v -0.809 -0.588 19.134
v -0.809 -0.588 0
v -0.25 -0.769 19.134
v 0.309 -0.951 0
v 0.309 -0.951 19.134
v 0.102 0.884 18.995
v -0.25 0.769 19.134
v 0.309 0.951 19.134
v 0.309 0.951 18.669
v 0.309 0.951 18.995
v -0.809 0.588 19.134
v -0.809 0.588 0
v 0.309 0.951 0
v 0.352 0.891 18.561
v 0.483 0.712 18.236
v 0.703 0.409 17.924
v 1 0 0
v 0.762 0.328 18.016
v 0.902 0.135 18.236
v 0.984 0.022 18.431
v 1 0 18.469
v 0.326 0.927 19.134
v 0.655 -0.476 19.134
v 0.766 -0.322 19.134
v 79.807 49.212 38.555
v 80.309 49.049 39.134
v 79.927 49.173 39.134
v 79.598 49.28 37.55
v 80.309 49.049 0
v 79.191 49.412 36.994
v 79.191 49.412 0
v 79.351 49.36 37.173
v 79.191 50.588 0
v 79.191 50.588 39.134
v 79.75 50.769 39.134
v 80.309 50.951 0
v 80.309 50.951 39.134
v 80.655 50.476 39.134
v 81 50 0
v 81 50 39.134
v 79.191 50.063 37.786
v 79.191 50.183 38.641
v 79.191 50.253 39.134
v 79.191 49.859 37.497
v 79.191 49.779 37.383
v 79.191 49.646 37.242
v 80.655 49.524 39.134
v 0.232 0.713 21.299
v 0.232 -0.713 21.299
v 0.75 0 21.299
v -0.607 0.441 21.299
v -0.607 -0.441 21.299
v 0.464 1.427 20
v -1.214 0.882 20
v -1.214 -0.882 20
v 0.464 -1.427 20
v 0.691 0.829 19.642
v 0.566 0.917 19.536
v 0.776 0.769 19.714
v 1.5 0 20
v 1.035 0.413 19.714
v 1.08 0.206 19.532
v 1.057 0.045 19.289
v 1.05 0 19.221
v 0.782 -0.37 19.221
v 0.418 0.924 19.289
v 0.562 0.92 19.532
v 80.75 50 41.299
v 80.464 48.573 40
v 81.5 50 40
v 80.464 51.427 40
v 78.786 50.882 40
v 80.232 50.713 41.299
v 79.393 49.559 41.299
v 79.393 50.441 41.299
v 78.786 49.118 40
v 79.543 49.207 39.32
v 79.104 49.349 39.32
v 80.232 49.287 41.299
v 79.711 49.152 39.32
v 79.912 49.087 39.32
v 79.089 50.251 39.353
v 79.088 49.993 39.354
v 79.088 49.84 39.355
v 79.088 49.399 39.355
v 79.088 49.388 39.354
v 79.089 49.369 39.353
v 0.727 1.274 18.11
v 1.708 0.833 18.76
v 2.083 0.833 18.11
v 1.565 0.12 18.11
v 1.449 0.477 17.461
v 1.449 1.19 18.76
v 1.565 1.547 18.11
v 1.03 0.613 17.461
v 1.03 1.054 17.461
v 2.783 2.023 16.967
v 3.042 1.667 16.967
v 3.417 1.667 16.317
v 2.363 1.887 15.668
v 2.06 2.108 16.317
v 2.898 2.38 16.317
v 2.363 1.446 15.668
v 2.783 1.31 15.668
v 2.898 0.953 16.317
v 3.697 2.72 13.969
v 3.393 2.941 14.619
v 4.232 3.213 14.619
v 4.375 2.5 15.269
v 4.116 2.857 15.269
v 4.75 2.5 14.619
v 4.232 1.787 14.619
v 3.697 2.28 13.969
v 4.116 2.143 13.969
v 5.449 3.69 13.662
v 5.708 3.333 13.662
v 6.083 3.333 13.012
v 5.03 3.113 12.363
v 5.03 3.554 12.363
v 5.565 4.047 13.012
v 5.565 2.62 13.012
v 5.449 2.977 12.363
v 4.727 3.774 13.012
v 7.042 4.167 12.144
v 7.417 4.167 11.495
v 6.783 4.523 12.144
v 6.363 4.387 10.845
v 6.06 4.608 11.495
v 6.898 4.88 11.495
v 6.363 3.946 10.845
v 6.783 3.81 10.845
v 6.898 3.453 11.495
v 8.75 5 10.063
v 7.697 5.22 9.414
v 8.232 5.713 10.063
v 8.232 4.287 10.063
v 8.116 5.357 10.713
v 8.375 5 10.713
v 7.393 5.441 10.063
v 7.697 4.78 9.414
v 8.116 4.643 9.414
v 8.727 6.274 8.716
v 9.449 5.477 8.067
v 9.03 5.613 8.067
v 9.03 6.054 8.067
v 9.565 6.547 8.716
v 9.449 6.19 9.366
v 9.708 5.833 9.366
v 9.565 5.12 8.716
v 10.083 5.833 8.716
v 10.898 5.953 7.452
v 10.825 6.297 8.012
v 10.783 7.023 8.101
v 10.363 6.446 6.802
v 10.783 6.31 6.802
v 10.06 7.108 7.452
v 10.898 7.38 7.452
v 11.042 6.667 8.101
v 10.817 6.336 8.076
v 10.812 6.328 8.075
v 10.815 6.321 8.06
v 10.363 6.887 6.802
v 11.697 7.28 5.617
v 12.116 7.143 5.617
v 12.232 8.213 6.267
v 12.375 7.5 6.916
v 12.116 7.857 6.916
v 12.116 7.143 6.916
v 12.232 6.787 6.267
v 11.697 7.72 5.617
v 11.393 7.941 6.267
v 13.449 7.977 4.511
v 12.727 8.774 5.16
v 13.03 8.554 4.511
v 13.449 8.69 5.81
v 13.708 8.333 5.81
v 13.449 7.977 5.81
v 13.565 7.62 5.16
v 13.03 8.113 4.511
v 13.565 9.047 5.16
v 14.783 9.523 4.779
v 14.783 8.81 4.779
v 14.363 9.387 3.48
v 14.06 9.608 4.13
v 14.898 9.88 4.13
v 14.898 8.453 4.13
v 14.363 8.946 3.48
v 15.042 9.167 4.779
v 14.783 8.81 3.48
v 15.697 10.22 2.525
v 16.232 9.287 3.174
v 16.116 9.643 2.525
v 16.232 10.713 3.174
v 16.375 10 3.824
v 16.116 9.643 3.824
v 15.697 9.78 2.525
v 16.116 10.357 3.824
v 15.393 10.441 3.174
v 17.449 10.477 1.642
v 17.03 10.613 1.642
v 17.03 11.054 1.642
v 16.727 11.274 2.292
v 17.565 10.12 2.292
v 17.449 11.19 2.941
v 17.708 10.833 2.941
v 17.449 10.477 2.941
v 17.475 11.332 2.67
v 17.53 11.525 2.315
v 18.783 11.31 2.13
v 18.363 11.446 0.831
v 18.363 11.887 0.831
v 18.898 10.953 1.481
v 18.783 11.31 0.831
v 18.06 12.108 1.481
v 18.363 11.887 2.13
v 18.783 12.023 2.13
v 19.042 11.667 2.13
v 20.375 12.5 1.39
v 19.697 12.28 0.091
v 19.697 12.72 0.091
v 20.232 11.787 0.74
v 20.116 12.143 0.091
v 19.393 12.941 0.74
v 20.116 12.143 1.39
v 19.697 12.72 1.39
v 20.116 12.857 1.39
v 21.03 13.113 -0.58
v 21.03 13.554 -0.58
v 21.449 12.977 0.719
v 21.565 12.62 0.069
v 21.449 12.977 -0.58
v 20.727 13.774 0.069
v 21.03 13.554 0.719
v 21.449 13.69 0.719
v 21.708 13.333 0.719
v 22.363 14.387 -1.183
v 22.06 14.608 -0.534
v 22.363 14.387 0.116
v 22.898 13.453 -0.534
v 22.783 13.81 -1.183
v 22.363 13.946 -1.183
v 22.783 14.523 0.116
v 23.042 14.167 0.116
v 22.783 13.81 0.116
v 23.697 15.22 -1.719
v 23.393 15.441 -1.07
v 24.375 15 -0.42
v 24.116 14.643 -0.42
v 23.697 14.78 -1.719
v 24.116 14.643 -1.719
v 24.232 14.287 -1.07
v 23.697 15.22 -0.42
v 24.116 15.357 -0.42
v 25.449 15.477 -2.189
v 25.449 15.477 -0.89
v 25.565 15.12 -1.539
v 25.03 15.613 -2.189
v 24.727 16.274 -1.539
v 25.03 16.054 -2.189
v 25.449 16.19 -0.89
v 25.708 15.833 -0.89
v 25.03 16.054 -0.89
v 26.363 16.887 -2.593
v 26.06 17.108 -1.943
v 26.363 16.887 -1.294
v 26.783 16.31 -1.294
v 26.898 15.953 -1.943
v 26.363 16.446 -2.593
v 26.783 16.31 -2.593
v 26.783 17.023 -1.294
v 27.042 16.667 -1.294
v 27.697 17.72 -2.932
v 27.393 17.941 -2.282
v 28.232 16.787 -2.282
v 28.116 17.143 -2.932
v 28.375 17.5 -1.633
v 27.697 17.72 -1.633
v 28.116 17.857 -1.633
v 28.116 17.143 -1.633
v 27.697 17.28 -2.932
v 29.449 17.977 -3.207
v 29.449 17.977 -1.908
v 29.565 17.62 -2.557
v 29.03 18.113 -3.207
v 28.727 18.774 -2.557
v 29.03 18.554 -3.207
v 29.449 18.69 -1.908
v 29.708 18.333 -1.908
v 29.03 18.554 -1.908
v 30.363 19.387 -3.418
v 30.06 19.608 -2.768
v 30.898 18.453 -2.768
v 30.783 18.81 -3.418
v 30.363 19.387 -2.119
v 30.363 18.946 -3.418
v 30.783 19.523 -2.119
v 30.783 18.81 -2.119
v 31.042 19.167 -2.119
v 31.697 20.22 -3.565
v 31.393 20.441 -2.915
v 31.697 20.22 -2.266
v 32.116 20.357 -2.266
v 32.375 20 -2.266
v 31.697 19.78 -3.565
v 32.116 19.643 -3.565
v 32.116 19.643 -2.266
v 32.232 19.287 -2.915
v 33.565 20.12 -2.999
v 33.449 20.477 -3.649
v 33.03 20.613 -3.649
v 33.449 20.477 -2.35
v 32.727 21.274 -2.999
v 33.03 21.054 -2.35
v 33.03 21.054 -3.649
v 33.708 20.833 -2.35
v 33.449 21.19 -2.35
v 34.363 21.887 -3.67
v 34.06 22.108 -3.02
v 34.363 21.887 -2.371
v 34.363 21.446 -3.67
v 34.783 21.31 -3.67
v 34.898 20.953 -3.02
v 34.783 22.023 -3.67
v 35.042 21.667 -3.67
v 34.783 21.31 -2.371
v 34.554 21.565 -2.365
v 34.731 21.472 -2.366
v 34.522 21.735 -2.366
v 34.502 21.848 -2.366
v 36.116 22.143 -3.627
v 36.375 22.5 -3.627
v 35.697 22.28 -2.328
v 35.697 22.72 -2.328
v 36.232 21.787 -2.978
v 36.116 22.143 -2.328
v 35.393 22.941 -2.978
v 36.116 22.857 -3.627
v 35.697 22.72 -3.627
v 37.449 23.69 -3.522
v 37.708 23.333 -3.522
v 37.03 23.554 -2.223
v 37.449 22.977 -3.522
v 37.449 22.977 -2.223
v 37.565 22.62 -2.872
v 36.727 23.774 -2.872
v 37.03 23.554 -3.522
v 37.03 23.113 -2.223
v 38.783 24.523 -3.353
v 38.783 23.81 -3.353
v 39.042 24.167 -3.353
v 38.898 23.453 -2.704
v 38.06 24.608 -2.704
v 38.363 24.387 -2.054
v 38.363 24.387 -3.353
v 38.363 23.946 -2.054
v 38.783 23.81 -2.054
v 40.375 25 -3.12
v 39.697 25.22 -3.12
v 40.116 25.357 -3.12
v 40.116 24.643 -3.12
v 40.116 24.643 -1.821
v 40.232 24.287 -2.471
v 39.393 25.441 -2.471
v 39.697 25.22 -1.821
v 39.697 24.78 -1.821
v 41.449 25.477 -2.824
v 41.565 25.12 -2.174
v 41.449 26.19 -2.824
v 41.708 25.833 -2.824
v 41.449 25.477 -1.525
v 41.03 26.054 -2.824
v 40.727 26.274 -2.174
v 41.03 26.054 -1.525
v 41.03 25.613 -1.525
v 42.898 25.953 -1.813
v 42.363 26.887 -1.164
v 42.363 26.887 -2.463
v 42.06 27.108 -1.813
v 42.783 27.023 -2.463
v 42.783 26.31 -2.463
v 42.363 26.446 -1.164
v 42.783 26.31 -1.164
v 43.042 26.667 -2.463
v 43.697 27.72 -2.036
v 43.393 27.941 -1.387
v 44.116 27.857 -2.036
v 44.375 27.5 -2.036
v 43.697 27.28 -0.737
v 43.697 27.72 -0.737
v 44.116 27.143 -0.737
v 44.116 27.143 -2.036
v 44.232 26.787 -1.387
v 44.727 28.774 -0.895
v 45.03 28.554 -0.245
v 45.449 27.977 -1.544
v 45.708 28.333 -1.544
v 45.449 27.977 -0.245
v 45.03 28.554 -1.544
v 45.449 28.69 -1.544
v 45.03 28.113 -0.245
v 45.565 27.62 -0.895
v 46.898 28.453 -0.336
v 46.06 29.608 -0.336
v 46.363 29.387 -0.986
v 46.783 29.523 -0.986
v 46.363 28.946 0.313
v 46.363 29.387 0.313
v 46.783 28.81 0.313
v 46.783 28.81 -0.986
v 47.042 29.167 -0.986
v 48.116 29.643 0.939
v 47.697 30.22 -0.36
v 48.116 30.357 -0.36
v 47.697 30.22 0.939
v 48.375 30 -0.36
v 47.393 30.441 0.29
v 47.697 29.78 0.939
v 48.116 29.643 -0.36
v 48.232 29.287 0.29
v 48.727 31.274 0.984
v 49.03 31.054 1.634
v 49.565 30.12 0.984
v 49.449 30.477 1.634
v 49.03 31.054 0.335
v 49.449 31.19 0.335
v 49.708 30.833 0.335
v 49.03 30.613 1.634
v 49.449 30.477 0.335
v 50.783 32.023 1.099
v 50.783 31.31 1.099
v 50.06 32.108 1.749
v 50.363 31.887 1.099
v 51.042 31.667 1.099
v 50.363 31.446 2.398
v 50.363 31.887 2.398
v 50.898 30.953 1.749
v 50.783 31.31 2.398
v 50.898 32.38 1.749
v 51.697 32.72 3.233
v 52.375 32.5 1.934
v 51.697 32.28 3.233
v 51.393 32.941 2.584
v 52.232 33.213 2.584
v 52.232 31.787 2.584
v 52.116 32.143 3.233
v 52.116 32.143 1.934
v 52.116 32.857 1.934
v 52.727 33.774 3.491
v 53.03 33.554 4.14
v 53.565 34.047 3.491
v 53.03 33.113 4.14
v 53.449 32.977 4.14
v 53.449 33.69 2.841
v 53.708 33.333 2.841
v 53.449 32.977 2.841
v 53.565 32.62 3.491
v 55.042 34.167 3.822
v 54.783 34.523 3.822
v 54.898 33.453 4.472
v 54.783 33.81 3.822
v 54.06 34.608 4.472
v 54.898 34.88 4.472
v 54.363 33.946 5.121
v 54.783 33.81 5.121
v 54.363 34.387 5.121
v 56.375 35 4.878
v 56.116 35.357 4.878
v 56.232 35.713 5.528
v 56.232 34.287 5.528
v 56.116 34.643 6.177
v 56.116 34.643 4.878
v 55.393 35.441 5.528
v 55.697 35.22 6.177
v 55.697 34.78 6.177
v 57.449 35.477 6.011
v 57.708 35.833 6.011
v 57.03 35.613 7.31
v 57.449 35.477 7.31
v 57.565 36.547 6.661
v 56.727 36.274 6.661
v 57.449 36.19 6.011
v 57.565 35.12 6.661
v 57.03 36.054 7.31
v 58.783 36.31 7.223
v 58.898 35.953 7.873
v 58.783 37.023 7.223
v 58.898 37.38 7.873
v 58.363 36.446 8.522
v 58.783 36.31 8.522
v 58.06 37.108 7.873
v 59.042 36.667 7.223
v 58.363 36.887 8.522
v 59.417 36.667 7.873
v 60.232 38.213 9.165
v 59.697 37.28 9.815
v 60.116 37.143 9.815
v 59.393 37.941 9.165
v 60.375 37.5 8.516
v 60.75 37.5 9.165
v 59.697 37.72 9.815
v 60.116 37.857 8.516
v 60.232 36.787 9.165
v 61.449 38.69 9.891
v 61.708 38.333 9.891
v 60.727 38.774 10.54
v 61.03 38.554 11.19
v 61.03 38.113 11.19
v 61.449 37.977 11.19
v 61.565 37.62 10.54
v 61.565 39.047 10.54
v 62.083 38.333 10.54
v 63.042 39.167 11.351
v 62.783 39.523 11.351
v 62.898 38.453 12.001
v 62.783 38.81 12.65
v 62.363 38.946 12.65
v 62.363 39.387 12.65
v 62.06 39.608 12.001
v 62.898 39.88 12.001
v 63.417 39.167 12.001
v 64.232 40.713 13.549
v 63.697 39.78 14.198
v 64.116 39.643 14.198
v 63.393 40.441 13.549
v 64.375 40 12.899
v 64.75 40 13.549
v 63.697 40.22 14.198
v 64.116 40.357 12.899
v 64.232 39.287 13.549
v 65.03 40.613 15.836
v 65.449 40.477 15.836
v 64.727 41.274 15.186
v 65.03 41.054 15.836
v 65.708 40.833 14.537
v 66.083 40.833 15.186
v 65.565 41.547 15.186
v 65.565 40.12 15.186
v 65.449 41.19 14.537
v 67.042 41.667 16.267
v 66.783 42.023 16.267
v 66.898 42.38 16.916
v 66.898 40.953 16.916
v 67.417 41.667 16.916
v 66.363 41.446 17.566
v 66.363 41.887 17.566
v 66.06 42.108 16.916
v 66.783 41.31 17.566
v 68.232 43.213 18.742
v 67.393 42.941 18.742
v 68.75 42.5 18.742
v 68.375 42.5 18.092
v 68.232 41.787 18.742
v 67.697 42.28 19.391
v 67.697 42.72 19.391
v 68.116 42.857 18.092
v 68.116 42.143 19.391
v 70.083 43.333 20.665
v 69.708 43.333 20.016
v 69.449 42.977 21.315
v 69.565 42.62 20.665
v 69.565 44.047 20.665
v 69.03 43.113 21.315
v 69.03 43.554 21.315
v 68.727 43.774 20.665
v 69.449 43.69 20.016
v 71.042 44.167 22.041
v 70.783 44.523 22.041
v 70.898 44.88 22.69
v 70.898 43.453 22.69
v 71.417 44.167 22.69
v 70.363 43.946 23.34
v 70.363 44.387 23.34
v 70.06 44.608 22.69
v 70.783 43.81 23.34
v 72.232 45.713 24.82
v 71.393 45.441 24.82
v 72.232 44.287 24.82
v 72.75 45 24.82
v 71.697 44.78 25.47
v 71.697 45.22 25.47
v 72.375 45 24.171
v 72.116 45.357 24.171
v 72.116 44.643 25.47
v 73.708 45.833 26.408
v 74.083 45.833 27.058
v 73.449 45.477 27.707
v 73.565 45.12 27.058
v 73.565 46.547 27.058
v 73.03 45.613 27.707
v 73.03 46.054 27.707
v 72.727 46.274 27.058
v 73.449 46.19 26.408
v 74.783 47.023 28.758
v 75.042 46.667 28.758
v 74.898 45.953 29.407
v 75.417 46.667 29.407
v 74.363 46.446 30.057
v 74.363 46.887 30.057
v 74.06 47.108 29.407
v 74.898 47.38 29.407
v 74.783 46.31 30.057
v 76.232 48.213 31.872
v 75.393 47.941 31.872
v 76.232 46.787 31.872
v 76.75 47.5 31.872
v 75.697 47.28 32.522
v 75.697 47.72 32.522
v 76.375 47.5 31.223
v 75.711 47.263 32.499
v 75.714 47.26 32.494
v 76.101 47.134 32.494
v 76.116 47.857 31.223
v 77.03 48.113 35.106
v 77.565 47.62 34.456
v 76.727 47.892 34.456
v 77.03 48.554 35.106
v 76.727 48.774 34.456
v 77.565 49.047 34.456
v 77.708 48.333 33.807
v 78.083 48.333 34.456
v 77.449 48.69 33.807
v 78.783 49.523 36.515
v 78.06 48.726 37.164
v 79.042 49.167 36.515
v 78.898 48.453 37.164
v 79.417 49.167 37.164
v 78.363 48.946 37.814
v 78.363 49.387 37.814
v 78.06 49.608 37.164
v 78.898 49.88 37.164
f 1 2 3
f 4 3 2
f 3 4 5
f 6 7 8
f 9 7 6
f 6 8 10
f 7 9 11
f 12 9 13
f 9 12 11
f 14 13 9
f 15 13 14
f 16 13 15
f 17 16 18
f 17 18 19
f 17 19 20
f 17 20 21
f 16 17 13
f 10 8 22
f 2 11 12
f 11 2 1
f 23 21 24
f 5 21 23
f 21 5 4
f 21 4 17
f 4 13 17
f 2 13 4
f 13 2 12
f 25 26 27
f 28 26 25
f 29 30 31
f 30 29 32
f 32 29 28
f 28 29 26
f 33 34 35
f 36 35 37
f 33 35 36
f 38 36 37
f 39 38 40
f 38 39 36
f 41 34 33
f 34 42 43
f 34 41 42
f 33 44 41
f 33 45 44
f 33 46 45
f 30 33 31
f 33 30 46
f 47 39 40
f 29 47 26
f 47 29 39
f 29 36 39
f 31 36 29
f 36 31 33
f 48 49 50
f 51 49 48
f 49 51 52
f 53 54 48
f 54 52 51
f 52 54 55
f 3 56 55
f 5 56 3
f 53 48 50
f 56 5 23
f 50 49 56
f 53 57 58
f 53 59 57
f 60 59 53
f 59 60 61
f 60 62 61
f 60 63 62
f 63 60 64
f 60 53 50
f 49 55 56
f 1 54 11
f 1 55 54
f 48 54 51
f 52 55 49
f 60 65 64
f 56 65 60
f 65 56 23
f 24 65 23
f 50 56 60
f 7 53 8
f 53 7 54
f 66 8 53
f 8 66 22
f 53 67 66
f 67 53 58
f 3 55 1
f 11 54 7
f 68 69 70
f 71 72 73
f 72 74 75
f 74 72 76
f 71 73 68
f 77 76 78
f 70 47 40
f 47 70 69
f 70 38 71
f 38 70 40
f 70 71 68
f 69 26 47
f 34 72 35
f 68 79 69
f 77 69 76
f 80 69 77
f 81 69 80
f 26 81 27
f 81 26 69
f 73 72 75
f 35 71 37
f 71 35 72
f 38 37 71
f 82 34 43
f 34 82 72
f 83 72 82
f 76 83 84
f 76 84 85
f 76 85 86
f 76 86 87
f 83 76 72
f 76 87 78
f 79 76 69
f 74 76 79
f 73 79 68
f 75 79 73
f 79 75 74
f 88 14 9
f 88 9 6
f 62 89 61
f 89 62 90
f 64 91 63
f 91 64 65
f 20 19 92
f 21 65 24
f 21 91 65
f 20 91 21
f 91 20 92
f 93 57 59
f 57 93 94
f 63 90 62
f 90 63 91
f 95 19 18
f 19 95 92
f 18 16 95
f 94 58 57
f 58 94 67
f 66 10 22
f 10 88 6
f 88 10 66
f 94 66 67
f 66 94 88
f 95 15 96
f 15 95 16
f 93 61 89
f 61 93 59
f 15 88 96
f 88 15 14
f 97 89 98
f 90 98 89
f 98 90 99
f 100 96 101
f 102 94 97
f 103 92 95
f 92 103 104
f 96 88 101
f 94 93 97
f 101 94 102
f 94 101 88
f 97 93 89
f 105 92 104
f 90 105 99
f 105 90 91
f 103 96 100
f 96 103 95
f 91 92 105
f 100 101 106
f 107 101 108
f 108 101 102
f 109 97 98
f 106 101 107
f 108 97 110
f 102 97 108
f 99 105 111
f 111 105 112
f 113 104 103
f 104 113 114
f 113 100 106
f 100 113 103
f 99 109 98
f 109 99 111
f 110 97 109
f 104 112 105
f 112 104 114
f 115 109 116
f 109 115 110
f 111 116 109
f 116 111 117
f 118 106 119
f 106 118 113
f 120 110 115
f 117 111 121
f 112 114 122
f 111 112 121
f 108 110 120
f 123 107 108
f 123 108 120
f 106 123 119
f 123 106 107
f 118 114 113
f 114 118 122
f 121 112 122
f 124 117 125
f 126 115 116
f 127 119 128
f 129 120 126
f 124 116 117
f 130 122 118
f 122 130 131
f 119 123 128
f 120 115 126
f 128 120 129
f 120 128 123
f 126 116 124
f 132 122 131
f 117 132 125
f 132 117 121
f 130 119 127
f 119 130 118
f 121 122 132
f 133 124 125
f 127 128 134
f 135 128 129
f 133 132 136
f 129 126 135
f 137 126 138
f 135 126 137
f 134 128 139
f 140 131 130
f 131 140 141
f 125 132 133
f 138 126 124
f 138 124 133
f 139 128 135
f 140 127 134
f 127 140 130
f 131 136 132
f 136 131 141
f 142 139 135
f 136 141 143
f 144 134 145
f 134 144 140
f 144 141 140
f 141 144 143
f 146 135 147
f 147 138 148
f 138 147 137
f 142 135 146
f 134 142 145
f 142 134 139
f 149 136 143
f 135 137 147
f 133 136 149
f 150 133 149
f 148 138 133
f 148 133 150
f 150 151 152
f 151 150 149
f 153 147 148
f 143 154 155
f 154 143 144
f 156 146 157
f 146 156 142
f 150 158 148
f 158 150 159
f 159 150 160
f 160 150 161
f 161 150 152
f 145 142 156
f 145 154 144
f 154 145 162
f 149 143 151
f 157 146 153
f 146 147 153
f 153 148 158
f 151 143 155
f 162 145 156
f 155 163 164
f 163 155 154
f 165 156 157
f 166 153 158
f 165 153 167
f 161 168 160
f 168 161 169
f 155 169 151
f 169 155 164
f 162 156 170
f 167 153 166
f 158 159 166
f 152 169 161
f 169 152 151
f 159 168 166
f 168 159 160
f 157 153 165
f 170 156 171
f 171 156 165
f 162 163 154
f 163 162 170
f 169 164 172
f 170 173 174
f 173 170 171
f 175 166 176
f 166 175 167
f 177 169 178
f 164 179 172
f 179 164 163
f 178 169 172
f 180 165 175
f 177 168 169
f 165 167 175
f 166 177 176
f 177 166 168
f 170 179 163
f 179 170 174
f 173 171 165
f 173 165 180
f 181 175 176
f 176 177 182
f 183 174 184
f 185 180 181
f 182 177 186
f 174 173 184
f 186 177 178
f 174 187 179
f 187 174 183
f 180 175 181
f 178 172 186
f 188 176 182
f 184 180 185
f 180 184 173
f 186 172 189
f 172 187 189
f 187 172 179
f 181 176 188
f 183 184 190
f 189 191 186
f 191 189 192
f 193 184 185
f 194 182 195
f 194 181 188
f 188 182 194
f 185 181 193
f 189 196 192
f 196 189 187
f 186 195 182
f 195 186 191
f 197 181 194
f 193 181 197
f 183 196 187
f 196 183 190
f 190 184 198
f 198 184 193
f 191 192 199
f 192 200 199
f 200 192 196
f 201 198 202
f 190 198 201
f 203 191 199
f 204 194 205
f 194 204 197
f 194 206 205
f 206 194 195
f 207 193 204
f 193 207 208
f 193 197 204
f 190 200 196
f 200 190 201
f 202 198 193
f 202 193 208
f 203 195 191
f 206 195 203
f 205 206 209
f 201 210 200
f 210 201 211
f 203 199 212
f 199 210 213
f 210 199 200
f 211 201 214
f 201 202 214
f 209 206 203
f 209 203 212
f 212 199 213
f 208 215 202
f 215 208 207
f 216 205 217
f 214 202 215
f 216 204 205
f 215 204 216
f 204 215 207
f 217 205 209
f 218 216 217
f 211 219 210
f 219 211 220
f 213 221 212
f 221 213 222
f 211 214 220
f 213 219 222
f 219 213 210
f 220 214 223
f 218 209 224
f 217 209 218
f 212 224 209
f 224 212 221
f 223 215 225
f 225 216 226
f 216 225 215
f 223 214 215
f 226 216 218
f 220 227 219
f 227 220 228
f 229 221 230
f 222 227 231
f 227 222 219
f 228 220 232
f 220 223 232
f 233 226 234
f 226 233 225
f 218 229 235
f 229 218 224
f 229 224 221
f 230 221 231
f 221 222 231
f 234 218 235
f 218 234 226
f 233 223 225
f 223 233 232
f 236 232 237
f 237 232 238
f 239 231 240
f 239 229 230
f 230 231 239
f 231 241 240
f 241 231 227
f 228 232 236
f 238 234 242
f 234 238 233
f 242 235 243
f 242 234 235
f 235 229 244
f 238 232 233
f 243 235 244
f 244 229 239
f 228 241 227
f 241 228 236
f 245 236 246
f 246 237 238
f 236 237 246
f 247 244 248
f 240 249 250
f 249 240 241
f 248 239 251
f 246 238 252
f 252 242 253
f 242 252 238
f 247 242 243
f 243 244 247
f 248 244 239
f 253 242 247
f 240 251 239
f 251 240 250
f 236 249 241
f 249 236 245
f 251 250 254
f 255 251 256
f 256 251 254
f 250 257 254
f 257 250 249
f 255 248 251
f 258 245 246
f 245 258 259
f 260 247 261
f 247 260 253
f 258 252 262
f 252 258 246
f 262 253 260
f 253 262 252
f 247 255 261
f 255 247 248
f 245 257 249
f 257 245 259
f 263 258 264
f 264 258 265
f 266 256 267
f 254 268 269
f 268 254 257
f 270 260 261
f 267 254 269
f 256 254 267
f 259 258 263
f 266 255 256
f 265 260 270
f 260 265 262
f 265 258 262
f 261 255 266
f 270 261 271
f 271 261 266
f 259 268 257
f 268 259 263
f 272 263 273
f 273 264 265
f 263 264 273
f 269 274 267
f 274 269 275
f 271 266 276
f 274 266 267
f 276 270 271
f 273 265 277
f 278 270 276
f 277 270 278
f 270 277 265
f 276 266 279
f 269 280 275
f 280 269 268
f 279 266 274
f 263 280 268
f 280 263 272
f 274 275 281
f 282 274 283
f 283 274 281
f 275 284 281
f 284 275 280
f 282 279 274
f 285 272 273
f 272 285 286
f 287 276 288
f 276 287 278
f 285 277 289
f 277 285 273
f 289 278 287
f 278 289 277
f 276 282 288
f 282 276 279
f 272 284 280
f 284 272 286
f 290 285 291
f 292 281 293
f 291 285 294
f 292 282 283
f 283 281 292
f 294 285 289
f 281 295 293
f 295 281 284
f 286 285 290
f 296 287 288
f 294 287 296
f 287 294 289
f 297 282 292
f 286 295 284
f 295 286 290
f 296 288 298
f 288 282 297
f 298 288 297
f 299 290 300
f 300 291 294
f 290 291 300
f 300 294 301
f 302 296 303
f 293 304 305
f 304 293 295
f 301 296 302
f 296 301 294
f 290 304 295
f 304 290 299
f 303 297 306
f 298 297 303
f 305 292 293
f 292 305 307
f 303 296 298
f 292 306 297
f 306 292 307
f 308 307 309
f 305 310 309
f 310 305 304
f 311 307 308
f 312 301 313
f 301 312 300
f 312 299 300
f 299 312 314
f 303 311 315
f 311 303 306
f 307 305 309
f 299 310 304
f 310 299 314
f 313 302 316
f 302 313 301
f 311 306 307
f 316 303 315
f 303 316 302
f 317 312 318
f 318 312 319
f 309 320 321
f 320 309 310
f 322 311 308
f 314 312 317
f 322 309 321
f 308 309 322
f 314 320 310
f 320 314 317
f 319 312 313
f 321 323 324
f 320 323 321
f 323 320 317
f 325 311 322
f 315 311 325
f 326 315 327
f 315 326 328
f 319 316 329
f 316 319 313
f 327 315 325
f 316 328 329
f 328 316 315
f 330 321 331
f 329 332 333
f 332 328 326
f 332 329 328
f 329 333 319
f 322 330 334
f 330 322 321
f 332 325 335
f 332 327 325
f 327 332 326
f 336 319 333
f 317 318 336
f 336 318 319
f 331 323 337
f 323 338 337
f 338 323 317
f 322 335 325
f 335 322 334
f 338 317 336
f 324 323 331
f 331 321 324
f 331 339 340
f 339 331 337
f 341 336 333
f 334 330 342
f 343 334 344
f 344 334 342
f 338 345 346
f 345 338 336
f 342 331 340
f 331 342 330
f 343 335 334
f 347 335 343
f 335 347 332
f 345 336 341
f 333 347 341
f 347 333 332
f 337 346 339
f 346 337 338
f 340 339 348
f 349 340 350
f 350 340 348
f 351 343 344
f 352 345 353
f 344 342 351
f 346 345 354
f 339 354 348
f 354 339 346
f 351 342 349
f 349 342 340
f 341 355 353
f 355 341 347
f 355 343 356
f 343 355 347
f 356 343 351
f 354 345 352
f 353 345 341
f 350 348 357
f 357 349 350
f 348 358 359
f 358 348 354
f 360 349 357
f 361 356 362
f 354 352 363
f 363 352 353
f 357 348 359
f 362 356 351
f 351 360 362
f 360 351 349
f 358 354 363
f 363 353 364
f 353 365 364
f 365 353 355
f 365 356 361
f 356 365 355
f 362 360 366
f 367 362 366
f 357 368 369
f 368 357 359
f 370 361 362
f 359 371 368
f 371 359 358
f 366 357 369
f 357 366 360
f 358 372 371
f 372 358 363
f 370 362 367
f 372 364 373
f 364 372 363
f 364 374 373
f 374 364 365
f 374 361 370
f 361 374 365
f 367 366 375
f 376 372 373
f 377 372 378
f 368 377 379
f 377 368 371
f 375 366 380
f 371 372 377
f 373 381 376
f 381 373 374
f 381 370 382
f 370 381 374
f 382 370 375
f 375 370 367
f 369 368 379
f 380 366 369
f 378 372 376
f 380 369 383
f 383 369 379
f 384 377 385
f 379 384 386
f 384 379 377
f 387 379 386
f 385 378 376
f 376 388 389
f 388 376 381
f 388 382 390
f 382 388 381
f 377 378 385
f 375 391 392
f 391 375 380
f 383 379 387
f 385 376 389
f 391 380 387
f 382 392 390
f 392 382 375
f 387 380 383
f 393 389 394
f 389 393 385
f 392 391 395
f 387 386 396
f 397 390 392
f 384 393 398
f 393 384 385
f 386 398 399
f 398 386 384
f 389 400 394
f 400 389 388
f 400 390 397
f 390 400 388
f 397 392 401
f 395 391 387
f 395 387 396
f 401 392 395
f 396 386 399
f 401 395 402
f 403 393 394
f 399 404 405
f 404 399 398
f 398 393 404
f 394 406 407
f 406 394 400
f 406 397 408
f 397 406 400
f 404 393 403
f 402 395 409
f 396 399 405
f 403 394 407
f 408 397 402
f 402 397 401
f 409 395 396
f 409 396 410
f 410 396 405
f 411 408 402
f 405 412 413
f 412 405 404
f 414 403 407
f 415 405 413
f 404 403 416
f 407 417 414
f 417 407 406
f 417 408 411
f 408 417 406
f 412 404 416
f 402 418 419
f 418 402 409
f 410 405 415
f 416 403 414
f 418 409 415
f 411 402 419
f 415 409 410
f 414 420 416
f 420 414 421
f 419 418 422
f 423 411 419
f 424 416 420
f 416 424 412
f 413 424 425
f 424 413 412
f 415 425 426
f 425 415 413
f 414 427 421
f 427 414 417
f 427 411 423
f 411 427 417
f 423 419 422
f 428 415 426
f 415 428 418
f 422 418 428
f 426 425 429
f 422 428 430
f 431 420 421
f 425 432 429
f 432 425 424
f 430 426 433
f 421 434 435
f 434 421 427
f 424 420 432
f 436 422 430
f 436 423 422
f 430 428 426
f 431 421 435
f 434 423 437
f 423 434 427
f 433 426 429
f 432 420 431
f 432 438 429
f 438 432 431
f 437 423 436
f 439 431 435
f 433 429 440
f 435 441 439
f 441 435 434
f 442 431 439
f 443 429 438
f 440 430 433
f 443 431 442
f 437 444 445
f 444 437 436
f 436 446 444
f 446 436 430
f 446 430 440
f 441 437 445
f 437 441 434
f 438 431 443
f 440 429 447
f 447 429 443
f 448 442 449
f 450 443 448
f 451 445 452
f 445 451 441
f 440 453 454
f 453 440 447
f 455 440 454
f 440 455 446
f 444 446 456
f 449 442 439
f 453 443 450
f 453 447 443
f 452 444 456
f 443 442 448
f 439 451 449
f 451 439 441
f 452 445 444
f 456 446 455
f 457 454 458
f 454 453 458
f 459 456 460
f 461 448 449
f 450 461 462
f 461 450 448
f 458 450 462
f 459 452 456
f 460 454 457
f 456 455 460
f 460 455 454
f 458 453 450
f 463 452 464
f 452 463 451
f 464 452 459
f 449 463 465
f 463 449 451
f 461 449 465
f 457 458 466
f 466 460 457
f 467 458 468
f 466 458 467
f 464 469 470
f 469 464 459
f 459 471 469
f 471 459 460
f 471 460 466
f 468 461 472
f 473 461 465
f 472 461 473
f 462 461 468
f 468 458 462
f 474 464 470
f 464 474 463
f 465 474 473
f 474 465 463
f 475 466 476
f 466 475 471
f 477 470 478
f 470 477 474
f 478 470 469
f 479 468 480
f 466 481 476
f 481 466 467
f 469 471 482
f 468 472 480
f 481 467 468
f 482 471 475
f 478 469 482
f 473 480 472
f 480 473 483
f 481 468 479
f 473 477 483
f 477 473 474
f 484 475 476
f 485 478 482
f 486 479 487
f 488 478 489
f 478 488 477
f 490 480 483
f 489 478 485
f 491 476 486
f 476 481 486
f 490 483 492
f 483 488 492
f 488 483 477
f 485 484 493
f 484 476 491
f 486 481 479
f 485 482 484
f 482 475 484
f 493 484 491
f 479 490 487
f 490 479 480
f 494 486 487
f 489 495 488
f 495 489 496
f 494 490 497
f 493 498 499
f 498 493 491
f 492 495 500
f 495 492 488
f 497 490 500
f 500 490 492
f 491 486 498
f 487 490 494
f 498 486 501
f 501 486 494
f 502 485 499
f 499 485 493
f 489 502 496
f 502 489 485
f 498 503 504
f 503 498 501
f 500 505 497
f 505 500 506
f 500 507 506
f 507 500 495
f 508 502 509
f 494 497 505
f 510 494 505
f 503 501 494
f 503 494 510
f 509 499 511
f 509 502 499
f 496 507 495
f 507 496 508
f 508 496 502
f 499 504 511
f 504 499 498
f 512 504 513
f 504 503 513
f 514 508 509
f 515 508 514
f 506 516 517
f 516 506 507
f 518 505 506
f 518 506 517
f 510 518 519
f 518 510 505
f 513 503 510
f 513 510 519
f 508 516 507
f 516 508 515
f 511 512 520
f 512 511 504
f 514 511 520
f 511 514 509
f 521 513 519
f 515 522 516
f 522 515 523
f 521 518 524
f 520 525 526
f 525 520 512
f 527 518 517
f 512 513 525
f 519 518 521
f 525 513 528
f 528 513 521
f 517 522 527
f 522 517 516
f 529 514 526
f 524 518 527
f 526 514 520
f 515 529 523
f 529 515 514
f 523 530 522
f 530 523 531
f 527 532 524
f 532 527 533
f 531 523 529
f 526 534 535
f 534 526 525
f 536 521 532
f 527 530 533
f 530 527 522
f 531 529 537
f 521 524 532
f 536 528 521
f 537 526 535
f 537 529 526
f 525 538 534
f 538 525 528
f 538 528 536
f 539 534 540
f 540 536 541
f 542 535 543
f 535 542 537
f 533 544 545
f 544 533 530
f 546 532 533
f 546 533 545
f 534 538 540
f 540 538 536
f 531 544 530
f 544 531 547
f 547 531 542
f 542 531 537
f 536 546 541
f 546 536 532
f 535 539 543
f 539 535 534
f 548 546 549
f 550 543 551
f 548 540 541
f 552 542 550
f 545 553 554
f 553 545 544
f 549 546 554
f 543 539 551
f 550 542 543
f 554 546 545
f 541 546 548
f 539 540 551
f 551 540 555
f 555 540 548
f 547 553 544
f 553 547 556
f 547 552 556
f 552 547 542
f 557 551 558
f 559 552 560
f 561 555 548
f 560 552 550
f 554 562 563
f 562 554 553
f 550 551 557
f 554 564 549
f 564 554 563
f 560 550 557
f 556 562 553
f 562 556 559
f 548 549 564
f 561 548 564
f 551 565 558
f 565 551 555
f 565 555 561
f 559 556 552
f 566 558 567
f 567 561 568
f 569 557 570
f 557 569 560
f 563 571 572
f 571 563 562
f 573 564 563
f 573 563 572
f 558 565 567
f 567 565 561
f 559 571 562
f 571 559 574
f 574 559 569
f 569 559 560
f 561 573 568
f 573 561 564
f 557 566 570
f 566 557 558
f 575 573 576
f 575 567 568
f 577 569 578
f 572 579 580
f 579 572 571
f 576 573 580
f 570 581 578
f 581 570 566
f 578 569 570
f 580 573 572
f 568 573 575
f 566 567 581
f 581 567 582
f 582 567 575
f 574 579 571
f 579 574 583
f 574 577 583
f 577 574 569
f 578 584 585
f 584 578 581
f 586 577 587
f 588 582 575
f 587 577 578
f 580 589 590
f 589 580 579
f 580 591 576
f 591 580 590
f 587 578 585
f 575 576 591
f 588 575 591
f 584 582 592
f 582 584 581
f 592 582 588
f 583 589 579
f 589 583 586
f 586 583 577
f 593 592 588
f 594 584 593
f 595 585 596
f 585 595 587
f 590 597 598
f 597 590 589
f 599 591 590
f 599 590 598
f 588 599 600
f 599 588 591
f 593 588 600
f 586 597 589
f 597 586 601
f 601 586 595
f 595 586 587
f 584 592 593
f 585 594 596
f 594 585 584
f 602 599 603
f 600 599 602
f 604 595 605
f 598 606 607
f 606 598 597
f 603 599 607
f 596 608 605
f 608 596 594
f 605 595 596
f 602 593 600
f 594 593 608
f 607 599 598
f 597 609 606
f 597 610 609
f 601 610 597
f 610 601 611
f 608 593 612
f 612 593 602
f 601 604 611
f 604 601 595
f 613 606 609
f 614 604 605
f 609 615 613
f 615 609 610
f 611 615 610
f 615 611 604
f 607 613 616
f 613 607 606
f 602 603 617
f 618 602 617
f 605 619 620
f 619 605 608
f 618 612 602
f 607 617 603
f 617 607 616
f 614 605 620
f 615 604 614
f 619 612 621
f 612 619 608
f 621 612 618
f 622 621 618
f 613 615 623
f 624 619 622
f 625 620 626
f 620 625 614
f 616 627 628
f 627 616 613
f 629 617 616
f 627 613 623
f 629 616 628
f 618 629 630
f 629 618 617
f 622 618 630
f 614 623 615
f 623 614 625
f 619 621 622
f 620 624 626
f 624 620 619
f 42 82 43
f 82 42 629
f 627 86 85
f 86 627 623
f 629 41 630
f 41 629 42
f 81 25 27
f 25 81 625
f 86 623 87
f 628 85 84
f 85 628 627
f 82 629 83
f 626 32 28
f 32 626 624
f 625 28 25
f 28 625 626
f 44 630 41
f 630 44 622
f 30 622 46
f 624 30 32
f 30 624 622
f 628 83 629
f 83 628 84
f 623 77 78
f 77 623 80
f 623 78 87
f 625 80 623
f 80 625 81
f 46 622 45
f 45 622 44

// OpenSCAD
// ==========================================
// Catenary Generation Functions
// ==========================================

// Helper functions: Hyperbolic Trigonometry
function sinh(x)  = (exp(x) - exp(-x)) / 2;
function cosh(x)  = (exp(x) + exp(-x)) / 2;
function asinh(x) = ln(x + sqrt(x * x + 1));

// Helper function: Recursive Binary Search to find the parameter 'z'
// Solves sinh(z)/z = target
function solve_catenary_z(target, low=0.0001, high=50, steps=30) =
    steps <= 0 ? (low + high) / 2 :
    let(
        mid = (low + high) / 2,
        val = sinh(mid) / mid
    )
    (val < target) ? 
        solve_catenary_z(target, mid, high, steps - 1) : 
        solve_catenary_z(target, low, mid, steps - 1);

/*
    Generates a list of 3D points forming a catenary curve.
    
    Args:
        p1 (vector): Start point [x, y, z]
        p2 (vector): End point [x, y, z]
        slackness (float): Ratio of curve length to straight-line distance (> 1.0)
        spacing (float): Approximate distance between points
        
    Returns:
        List of [x, y, z] vectors
*/
function catenary_points(p1, p2, slackness=1.2, spacing=1) = 
    let(
        // 1. Calculate dimensions in the vertical plane
        vec = p2 - p1,
        dist_straight = norm(vec),
        
        // Horizontal distance on the XY plane
        h_dist = norm([vec.x, vec.y]), 
        // Vertical distance
        v_dist = vec.z,
        
        // Actual length of the curve
        // Ensure slackness is at least slightly > 1 to avoid division by zero errors
        safe_slack = max(slackness, 1.0001),
        curve_len = dist_straight * safe_slack
    )
    // Edge case: Vertical alignment (infinite tension for finite 'a')
    // We return a straight line if h_dist is near zero or slackness is 1
    (h_dist < 0.001 || safe_slack <= 1.0001) ? [p1, p2] :
    let(
        // 2. Solve for Catenary Parameters
        // We need to find 'a' (scaling factor) and (x0, y0) (vertex offset)
        // Based on equation: sqrt(Length^2 - V_dist^2) = 2a * sinh(H_dist / 2a)
        
        // K is the projection of the arc length onto the horizontal-equivalent tension domain
        K = sqrt(pow(curve_len, 2) - pow(v_dist, 2)),
        
        // We solve for z = h_dist / (2a)
        // Target ratio for the solver: sinh(z)/z = K / h_dist
        target_ratio = K / h_dist,
        z = solve_catenary_z(target_ratio),
        
        // Calculate the Catenary Constant 'a'
        a = h_dist / (2 * z),
        
        // Calculate the vertex offsets (x0, y0) in the local 2D plane
        // x0 is the horizontal distance from p1 to the curve's lowest point
        x0 = h_dist / 2 - a * asinh(v_dist / K),
        y0 = -a * cosh(x0 / a), // Offset so that local_y(0) starts at 0 relative shift
        
        // 3. Generate Points
        num_segments = max(1, round(curve_len / spacing)),
        step_u = h_dist / num_segments,
        
        // Unit vector for horizontal direction on XY plane
        h_dir = [vec.x, vec.y, 0] / h_dist
    )
    [
        for (i = [0 : num_segments])
        let(
            // u is the horizontal distance along the line connecting p1_xy and p2_xy
            u = i * step_u,
            
            // Calculate height in local 2D coordinates
            // Standard Catenary: y = a * cosh((x - x0) / a) + y0
            local_z = a * cosh((u - x0) / a) + y0
        )
        // Map back to 3D: P1 + Horizontal_Vector * u + Vertical_Offset
        p1 + h_dir * u + [0, 0, local_z]
    ];

// ==========================================
// Example Usage
// ==========================================

// Define parameters
pt_start = [0, 0, 20];
pt_end   = [80, 50, 40];
slack    = 1.25;
step     = 2;

module catenary(pt_start, pt_end, slack, step, thickness=1.5) {
    // Generate the points
    points = catenary_points(pt_start, pt_end, slack, step);

    // Visualization Module
    module draw_chain(pts, thickness=1) {
        // Iterate through points and connect them
        for (i = [0 : len(pts) - 2]) {
            hull()
            {
                translate(pts[i]) sphere(d=thickness);
                translate(pts[i+1]) sphere(d=thickness);
            }
        }
    }
    
    draw_chain(points, thickness);
}

// 1. Draw the reference poles
color([0.7, 0.7, 0.7]) {
    translate([pt_start.x, pt_start.y, 0]) cylinder(h=pt_start.z, d=2);
    translate([pt_end.x, pt_end.y, 0]) cylinder(h=pt_end.z, d=2);
}

// 2. Draw the endpoints
color("red") {
    translate(pt_start) sphere(d=3);
    translate(pt_end) sphere(d=3);
}

// 3. Draw the calculated catenary curve
color("gold") 
catenary(pt_start, pt_end, slack, step);
